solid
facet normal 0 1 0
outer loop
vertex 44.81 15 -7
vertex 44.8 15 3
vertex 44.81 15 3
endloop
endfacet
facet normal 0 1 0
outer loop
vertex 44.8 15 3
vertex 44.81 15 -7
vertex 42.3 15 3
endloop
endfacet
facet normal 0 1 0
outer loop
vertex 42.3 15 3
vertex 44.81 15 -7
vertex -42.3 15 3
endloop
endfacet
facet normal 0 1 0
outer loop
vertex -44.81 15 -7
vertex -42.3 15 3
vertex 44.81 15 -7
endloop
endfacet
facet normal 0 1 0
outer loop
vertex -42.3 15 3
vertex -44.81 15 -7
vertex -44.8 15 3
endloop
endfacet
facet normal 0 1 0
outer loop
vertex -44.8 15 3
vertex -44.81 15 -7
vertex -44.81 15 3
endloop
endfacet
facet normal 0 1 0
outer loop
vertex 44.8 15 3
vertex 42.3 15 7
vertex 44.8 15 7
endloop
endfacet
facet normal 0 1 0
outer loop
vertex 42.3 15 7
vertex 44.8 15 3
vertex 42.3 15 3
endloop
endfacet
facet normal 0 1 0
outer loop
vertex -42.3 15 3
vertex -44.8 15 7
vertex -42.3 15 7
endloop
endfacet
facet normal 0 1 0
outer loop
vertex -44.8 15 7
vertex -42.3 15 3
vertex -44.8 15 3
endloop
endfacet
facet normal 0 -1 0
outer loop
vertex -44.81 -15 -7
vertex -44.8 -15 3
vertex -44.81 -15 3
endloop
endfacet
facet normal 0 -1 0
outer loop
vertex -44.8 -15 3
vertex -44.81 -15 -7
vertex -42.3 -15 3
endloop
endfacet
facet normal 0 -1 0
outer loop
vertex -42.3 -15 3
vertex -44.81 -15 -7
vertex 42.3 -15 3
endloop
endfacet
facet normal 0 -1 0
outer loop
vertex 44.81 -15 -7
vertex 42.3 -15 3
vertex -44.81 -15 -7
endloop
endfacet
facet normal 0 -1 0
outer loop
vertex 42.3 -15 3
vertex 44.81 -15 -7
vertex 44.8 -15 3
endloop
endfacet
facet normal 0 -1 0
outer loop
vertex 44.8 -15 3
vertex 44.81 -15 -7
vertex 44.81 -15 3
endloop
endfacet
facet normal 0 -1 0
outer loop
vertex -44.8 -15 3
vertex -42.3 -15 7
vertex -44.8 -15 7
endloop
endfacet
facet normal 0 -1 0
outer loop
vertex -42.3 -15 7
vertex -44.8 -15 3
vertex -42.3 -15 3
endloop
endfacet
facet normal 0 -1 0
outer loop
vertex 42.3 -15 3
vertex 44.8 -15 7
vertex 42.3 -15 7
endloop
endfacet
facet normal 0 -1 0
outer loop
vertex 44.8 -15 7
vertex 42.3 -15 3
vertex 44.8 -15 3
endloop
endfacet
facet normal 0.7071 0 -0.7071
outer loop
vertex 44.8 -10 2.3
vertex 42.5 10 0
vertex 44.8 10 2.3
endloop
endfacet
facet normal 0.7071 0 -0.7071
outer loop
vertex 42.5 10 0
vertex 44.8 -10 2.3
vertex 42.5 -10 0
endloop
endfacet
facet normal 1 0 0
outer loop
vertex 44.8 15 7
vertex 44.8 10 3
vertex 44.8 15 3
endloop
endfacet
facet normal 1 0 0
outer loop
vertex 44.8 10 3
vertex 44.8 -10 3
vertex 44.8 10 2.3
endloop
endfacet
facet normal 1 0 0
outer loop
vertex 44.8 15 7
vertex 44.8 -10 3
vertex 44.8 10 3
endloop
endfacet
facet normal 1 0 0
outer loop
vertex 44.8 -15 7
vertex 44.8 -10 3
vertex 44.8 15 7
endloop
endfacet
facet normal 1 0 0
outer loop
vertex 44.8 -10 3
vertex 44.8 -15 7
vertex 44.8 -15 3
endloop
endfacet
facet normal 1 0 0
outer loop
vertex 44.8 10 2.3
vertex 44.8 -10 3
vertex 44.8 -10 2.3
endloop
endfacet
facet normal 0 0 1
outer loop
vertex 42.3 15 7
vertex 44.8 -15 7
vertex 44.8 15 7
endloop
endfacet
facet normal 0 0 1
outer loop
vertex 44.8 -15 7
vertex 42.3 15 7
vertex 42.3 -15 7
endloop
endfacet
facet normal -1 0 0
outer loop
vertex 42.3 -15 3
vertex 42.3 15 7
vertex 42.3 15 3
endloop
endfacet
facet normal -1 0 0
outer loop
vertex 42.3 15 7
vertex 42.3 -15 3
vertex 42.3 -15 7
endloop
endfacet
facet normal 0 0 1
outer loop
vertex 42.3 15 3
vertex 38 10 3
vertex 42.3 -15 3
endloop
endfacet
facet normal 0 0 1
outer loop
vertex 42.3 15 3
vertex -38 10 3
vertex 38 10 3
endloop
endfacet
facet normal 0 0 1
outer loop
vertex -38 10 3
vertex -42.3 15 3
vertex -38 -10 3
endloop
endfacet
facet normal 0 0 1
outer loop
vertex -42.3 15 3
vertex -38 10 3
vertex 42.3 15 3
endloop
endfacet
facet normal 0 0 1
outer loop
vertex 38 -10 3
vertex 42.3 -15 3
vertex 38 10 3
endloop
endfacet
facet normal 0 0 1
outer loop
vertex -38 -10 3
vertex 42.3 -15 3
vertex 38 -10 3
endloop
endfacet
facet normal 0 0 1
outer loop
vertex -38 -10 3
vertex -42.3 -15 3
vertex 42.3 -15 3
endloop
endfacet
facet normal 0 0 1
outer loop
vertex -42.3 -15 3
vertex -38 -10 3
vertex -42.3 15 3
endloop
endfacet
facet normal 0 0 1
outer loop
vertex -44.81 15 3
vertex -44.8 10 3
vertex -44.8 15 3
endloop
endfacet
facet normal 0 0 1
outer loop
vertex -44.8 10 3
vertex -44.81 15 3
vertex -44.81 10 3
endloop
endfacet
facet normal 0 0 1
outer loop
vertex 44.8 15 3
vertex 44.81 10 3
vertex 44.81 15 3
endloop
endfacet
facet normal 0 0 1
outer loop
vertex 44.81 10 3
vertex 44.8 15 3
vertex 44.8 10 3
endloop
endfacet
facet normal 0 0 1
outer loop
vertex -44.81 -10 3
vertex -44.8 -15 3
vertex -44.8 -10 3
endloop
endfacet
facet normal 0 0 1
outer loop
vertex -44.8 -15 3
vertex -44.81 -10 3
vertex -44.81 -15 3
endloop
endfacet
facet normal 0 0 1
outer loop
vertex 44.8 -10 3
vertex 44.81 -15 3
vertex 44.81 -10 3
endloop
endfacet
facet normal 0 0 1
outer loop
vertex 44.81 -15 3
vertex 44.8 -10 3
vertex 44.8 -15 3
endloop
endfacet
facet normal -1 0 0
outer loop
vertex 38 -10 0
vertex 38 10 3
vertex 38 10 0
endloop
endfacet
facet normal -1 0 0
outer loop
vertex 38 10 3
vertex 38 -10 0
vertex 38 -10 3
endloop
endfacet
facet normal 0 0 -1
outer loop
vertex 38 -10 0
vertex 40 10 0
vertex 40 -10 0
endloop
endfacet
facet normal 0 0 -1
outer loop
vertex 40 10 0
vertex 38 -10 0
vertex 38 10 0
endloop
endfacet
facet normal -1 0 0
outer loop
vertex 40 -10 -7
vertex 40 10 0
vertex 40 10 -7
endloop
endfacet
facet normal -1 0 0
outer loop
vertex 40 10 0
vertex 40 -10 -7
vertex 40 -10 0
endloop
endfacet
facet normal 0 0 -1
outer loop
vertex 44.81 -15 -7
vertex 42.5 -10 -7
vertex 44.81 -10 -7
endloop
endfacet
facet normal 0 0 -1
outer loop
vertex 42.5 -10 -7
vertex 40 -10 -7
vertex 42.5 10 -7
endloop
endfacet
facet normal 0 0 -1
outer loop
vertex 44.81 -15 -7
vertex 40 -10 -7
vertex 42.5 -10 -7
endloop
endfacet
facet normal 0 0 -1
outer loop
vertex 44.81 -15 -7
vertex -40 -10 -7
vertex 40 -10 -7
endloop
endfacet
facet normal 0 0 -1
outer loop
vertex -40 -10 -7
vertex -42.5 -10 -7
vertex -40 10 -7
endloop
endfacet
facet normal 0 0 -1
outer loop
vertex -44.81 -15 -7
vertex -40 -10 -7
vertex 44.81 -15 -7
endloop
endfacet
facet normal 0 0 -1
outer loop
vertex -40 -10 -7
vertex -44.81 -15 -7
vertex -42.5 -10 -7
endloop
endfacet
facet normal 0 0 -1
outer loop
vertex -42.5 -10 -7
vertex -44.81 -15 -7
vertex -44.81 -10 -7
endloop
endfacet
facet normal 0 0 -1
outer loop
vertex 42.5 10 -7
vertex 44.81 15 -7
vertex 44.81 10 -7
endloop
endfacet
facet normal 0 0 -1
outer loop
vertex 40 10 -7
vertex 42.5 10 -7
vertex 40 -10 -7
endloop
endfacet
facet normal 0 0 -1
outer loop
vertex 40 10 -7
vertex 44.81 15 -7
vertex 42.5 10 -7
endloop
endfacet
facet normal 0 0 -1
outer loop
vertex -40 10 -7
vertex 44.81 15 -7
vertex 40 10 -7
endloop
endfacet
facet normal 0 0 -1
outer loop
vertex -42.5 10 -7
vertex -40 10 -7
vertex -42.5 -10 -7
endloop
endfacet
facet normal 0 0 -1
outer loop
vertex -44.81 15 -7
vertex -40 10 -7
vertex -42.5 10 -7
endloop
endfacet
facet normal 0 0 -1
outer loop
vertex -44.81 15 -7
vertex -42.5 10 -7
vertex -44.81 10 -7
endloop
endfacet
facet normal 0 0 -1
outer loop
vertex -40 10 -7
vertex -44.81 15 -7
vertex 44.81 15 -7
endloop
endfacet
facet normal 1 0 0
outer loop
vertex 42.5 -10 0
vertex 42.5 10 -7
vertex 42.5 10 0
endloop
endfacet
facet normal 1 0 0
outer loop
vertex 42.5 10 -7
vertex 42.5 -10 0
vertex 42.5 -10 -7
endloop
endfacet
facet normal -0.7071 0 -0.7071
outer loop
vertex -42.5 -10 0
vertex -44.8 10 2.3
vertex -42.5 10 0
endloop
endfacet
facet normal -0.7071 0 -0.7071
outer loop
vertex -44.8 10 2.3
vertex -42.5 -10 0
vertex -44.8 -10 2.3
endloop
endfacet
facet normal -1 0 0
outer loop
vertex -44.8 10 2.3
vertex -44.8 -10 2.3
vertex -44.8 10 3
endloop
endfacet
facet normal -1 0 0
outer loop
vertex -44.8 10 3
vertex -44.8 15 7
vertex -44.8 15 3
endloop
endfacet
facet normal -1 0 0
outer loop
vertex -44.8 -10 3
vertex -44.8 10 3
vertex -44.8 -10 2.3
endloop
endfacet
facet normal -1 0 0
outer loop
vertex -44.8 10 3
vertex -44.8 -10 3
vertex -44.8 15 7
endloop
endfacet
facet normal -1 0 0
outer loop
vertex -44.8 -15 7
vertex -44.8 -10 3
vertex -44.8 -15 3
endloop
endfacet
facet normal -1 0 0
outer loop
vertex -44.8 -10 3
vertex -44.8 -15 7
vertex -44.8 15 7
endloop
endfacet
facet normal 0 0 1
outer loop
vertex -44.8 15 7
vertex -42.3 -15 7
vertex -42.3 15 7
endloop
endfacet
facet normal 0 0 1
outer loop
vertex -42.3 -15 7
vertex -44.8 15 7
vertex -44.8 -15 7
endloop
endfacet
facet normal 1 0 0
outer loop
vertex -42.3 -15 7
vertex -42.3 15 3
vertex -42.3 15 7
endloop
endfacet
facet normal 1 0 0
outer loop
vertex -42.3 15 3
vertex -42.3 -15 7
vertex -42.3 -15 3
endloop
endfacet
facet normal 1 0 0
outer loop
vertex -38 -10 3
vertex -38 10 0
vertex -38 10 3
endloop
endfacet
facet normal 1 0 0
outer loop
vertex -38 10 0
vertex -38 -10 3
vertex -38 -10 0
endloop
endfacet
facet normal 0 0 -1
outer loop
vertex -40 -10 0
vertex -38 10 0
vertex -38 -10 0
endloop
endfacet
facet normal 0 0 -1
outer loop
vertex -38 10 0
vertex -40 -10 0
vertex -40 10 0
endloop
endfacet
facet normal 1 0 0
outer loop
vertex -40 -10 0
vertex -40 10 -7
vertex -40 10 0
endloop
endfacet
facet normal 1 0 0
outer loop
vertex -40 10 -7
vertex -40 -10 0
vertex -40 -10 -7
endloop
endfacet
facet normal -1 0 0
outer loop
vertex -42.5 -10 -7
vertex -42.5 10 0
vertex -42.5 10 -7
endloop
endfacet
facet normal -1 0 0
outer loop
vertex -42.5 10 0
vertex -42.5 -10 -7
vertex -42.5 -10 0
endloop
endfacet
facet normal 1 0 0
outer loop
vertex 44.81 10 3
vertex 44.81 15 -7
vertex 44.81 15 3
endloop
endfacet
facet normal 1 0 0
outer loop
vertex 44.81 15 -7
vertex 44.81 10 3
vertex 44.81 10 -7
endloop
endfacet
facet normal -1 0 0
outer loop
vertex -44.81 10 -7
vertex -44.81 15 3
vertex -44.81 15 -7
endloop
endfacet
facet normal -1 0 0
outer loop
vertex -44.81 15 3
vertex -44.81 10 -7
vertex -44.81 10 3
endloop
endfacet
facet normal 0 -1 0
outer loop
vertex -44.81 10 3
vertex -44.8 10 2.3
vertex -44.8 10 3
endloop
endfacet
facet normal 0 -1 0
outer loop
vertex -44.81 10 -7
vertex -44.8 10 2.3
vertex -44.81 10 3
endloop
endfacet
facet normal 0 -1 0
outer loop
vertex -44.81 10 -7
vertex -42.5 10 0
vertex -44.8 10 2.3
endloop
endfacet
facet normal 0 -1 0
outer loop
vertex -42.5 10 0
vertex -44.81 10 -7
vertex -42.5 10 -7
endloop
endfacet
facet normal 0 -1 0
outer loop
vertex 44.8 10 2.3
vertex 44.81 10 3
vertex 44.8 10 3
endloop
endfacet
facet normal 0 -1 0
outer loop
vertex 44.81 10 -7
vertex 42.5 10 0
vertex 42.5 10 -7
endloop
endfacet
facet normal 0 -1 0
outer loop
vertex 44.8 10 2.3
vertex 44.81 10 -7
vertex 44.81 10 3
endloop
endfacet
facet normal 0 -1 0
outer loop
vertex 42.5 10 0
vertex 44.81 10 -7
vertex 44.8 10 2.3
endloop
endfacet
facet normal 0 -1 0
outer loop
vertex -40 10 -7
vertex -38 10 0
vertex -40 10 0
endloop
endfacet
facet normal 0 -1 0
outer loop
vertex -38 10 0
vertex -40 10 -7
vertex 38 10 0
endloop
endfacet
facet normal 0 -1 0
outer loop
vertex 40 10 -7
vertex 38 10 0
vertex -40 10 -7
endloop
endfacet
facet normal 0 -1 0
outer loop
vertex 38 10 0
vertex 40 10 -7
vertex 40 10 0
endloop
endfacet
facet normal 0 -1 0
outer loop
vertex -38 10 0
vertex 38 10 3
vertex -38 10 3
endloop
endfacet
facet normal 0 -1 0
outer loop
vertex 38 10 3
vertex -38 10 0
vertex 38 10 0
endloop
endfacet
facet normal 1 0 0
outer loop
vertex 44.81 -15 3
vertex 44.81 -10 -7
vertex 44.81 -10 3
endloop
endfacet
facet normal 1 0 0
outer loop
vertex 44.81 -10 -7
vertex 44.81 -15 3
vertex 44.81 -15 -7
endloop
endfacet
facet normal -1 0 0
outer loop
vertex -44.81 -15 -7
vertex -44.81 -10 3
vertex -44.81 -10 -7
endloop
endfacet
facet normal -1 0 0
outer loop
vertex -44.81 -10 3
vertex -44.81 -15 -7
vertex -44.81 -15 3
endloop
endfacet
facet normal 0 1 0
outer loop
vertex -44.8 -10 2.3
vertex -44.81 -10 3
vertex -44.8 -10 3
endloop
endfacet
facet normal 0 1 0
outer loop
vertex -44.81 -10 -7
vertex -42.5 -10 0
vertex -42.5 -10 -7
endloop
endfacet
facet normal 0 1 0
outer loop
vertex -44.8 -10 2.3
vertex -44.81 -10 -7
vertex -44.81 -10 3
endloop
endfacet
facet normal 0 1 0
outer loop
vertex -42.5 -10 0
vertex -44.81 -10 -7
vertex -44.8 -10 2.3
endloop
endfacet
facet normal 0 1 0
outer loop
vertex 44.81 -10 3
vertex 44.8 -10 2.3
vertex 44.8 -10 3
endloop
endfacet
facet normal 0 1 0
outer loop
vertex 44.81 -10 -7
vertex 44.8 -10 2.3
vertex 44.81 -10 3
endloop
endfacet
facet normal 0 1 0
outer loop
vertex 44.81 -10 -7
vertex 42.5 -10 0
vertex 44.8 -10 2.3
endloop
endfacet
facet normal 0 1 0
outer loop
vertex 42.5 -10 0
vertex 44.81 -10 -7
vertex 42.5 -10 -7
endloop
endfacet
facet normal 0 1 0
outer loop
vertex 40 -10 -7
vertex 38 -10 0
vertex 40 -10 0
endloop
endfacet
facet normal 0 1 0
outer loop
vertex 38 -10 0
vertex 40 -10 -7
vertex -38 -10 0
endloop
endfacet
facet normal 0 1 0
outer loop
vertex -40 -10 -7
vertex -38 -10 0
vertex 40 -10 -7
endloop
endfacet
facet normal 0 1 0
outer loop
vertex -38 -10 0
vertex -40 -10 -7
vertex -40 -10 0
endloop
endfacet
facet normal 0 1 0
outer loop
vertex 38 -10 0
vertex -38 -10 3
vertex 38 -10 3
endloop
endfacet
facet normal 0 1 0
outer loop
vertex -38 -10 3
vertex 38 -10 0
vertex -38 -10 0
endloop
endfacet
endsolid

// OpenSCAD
// file: ../lib/gridfinity.scad
// SPDX-License-Identifier: MIT
// Copyright (c) 2026 Aaron Cupp
//
// gridfinity.scad — shared Gridfinity baseplate + bin library (per spec).
//
// 42 mm pitch, 41.5 mm bins, baseplate socket 0.7/1.8/2.15 = 4.65 mm, 4 mm
// fillet; bin foot 0.8/1.8/2.15 = 4.75 mm, 3.75 mm corner radius. Verified the
// bin foot seats in the baseplate socket with ~0.25–0.5 mm clearance.
//
//   baseplate(nx, ny)                      — tiled receiving baseplate
//   bin_blank(nx, ny, h)                   — solid bin body (feet + block, no cavity)
//   bin(nx, ny, h, wall, floor)            — open Gridfinity bin
//   divided_bin(nx, ny, h, cols, rows, …)  — bin with internal compartments
//   lid(nx, ny, …)                         — friction lid for a bin of the same footprint
//   stack_base(nx, ny, h, …)               — baseplate-topped base; a bin socket-stacks on it

GF = 42; GF_FILLET = 4;
_C_TOP = 2.15; _C_MID = 1.8; _C_BOT = 0.7;
_BP_LIP = _C_TOP + _C_MID + _C_BOT; _BP_FLOOR = 1.2; BP_H = _BP_LIP + _BP_FLOOR;  // 5.85
BIN_SZ = 41.5; BIN_R = 3.75; BIN_BASE_H = 4.75;

// ---- baseplate ----
module _bp_cell(i = 0) { offset(r = -i) offset(r = GF_FILLET) offset(r = -GF_FILLET) square(GF, center = true); }
module _bp_socket() {
    e = 0.01;
    hull() { translate([0,0,BP_H-e]) linear_extrude(e) _bp_cell(0); translate([0,0,BP_H-_C_TOP]) linear_extrude(e) _bp_cell(_C_TOP); }
    translate([0,0,BP_H-_C_TOP-_C_MID]) linear_extrude(_C_MID) _bp_cell(_C_TOP);
    hull() { translate([0,0,BP_H-_C_TOP-_C_MID-e]) linear_extrude(e) _bp_cell(_C_TOP); translate([0,0,BP_H-_BP_LIP]) linear_extrude(e) _bp_cell(_C_TOP+_C_BOT); }
}
module baseplate(nx, ny) {
    w = nx*GF; d = ny*GF;
    difference() {
        translate([0,0,BP_H/2]) linear_extrude(BP_H, center=true) offset(GF_FILLET) offset(-GF_FILLET) square([w,d], center=true);
        for (ix=[0:nx-1], iy=[0:ny-1]) translate([(ix-(nx-1)/2)*GF, (iy-(ny-1)/2)*GF, 0]) _bp_socket();
    }
}

// ---- bin ----
module _bin_cell(i = 0) { offset(r = -i) offset(r = BIN_R) offset(r = -BIN_R) square(BIN_SZ, center = true); }
module _bin_foot() {
    e = 0.01;
    hull() { linear_extrude(e) _bin_cell(2.95); translate([0,0,0.8]) linear_extrude(e) _bin_cell(2.15); }    // bottom chamfer
    translate([0,0,0.8]) linear_extrude(1.8) _bin_cell(2.15);                                                 // vertical
    hull() { translate([0,0,2.6]) linear_extrude(e) _bin_cell(2.15); translate([0,0,BIN_BASE_H]) linear_extrude(e) _bin_cell(0); } // top chamfer
}
// Solid bin body: Gridfinity feet + the block above them, with no cavity cut.
// Cup-style bins (lib/vessel.scad) subtract their own bores from this instead of
// re-deriving the foot + shell union.
module bin_blank(nx, ny, h) {
    W = nx*GF - 0.5; D = ny*GF - 0.5;
    union() {
        for (ix=[0:nx-1], iy=[0:ny-1]) translate([(ix-(nx-1)/2)*GF, (iy-(ny-1)/2)*GF, 0]) _bin_foot();
        translate([0,0,BIN_BASE_H]) linear_extrude(h-BIN_BASE_H) offset(BIN_R) offset(-BIN_R) square([W,D], center=true);
    }
}

module _bin_shell(nx, ny, h, wall, floor) {
    W = nx*GF - 0.5; D = ny*GF - 0.5;
    difference() {
        bin_blank(nx, ny, h);
        translate([0,0,BIN_BASE_H+floor]) linear_extrude(h) offset(BIN_R-wall) offset(-(BIN_R-wall)) square([W-2*wall, D-2*wall], center=true);
    }
}
module bin(nx, ny, h, wall = 1.2, floor = 1.4) { _bin_shell(nx, ny, h, wall, floor); }

// ---- stacking base ----
// A bin whose TOP is a Gridfinity baseplate, so a standard bin socket-stacks on
// it (two-tier towers: instrument on top, cords/jig/adapters in the base). The
// base is open at the FRONT (−Y) by default so the lower item is reachable while
// the top tier stays socketed — same idea as drybox-splitter-stand's open cubby.
// The whole tower foots on the bench baseplate via this base's own foot.
//
//   h = interior height of the lower compartment (floor to the baseplate cap).
module stack_base(nx, ny, h, wall = 1.2, floor = 1.4, open_front = true) {
    W = nx*GF - 0.5; D = ny*GF - 0.5;
    z0 = BIN_BASE_H + floor;
    iw = W - 2*wall; id = D - 2*wall;
    difference() {
        union() {
            bin_blank(nx, ny, h);                    // solid foot + block to h
            translate([0,0,h]) baseplate(nx, ny);    // baseplate cap (sockets up)
        }
        // lower cavity, floor up to the cap underside
        translate([0,0,z0]) linear_extrude(h - z0 + 0.01)
            offset(BIN_R-wall) offset(-(BIN_R-wall)) square([iw, id], center=true);
        // open front: cut the −Y wall so you reach in under the cap
        if (open_front)
            translate([-iw/2, -D, z0]) cube([iw, D/2 + 0.01, h - z0 + 0.01]);
    }
}

module divided_bin(nx, ny, h, cols = 1, rows = 1, wall = 1.2, floor = 1.4, div = 1.2) {
    W = nx*GF - 0.5; D = ny*GF - 0.5;
    union() {
        bin(nx, ny, h, wall, floor);
        // internal divider walls (from the floor up to the rim)
        iw = W - 2*wall; id = D - 2*wall; z0 = BIN_BASE_H + floor;
        for (c = [1 : cols-1]) translate([-iw/2 + c*iw/cols - div/2, -id/2, z0]) cube([div, id, h - z0]);
        for (r = [1 : rows-1]) translate([-iw/2, -id/2 + r*id/rows - div/2, z0]) cube([iw, div, h - z0]);
    }
}

// ---- lid ----
// Friction lid for a bin of the same footprint: a flat plate with a skirt that
// drops into the bin's cavity. Emitted PRINT-READY — plate on the bed, skirt
// standing up — so it needs no supports. Flip it in your head to picture it
// fitted: the plate then caps the rim and the lid adds `t` to the stack height.
//
// Why lids exist here: full-extension drawer slides let small parts hop between
// compartments on a hard close, and brass inserts aren't magnetic — you can't
// sweep them back. `wall` must match the bin's wall so the skirt lands in the
// cavity; `clearance` is per-side slop between skirt and cavity.
module lid(nx, ny, t = 1.6, skirt = 4, wall = 1.2, clearance = 0.35, lid_wall = 1.6) {
    W = nx*GF - 0.5; D = ny*GF - 0.5;
    iw = W - 2*wall - 2*clearance; id = D - 2*wall - 2*clearance;   // skirt outer
    ir = BIN_R - wall;                                              // cavity corner radius
    union() {
        linear_extrude(t) offset(BIN_R) offset(-BIN_R) square([W, D], center=true);
        translate([0,0,t]) linear_extrude(skirt) difference() {
            offset(ir) offset(-ir) square([iw, id], center=true);
            offset(ir-lid_wall) offset(-(ir-lid_wall)) square([iw-2*lid_wall, id-2*lid_wall], center=true);
        }
    }
}
// file: engindot_frame.scad
// engindot_frame.scad — one-piece drop-over frame for the ENGINDOT top. PRINT ONE.
//
// Part 1 of 2. The stock Clickfinity plate (engindot_plate.scad) drops into the
// inner ledge and is bonded there; bins click into the plate. Same two-part
// split as owon-spm8104-tray, for the same reason — the plate must print
// latches-UP, the frame walls-DOWN, and no single orientation suits both.
//
// NO CLAMP, NO HARDWARE. Retention is passive:
//   * front/back LIPS hook the top edges  -> cannot slide fore-aft
//   * short side SKIRTS hug the case      -> cannot slide sideways
//   * gravity                             -> holds it down
//
// The skirts are deliberately SHORT here. The ENGINDOT vents the full height of
// both sides, so a 20 mm skirt like the OWON's would sit over the intake. The
// lips carry the retention; the skirts only locate. SKIRT_D is the knob.
//
// Unlike the OWON, the plate (84 mm) is much narrower than the case (102 mm),
// so the ledge is a real shelf spanning ~9 mm each side rather than a 2 mm lip.
// LEDGE_T is thickened to suit.
//
// PRINT: as rendered — walls UP, so the frame outline sits on the bed and the
// only overhang is the inner ledge, which bridges. No supports.
include <shortkiller_common.scad>

_TOP = LEDGE_T + PLATE_T_;

// One side jaw's cross-section (x, z), inner edge outward:
//
//   * a LEDGE_IN-wide lip that catches the plate edge
//   * a solid border, full height, from the plate edge out to the case wall
//   * the short skirt down the case side
//
// The border is SOLID rather than a shelf, and that is a printability decision,
// not a styling one. The plate (84) is much narrower than the lid (102), so the
// gap between them is ~9 mm per side. Carried at ledge height that would be a
// 9 mm one-sided cantilever running the full 217 mm — printed walls-up it hangs
// in air and needs support for its whole length. Full height, it is a wall
// sitting on the bed, and the ONLY overhang left is the LEDGE_IN lip, which
// bridges exactly like the OWON's does.
//
// It is also far stiffer, which this frame wants — it spans 217 mm on 2.5 mm
// skirts.
function _jaw_profile() = [
    [POCKET_HW - LEDGE_IN,  0],
    [POCKET_HW - LEDGE_IN,  LEDGE_T],
    [POCKET_HW,             LEDGE_T],
    [POCKET_HW,             _TOP],
    [TOP_OUT,               _TOP],
    [TOP_OUT,               RAMP],
    [SKIRT_OUT,             0],
    [SKIRT_OUT,            -SKIRT_D],
    [SKIRT_IN,             -SKIRT_D],
    [SKIRT_IN,              0],
];
// No inner ramp any more: the ledge now reaches inboard of the skirt to bear on
// the lid, so the old ramp would sit inside the case volume. Its 2 mm inward
// cantilever bridges, exactly as the OWON's does.

module _jaw(len) {
    translate([0, len/2, 0]) rotate([90, 0, 0])
        linear_extrude(len) polygon(_jaw_profile());
}

// Front/back end-bar: spans the full width, fuses into BOTH jaws to close the
// frame, and carries the lip that hooks the front/back top edge. Overlapped
// into the jaws so it merges without coincident planes.
module _end_bar(s, len) {
    y0 = s > 0 ? len/2 - END_BAR_T : -len/2;
    // FULL HEIGHT to _TOP. This is a printability constraint, not a fit one:
    // walls-up, the frame stands on its skirt tops, and a bar stopping short of
    // that plane bridges ~85 mm across the opening and sags. The plate clears it
    // by fitting BETWEEN the bars — hence the MOUNT_L assert.
    translate([-TOP_OUT - EPS, y0, -END_LIP_D])
        cube([2*TOP_OUT + 2*EPS, END_BAR_T, END_LIP_D + LEDGE_T]);
}

// len defaults to the real MOUNT_L. A short len gives a genuine slice of this
// same geometry for fit-testing — see frame_test_section.scad.
// Shelf carrying the plate's overhang past the end of the frame, 45-degree
// gusset underneath. Walls-down that gusset is self-supporting; a square shelf
// would be an 8.5 mm overhang running the full width.
module _end_shelf(s, len) {
    y0 = s > 0 ? len/2 : -len/2;
    pts = s > 0
        ? [[y0, -END_LIP_D], [y0 + SHELF_OUT, -END_LIP_D + SHELF_OUT],
           [y0 + SHELF_OUT, LEDGE_T], [y0, LEDGE_T]]
        : [[y0, -END_LIP_D], [y0, LEDGE_T],
           [y0 - SHELF_OUT, LEDGE_T], [y0 - SHELF_OUT, -END_LIP_D + SHELF_OUT]];
    translate([-TOP_OUT - EPS, 0, 0])
        rotate([90, 0, 90]) linear_extrude(2*TOP_OUT + 2*EPS) polygon(pts);
}

module frame(len = MOUNT_L) {
    _jaw(len);
    mirror([1, 0, 0]) _jaw(len);
    _end_bar(1, len);
    _end_bar(-1, len);
    // Below ~2 mm the shelf is a sliver wedge that adds nothing and goes
    // non-manifold against the end bar. The plate barely overhangs at that point.
    if (END_SHELF && SHELF_OUT >= 2) {
        _end_shelf(1, len);
        _end_shelf(-1, len);
    }
}

// Rendered WALLS-DOWN — as used AND as printed. Skirt bottoms and end-lip
// bottoms share the bed; the only overhangs are the two 45-degree ramps and the
// 2 mm plate ledge. Do NOT flip this: walls-up leaves the end bars in mid-air.
frame();
// main file
// frame_test_section — a 30 mm slice of engindot_frame.scad. PRINT THIS FIRST.
//
// Not a separate gauge: it calls the SAME frame() module at a short length, so
// the profile, the skirt, the ledge and the plate pocket are bit-identical to
// the real part. If this fits, the frame fits.
//
// Answers, for about 15 minutes and ~15 g:
//   1. Does the skirt drop over the lid snugly at the measured CASE_W = 84?
//   2. ⚠️ IT DOES **NOT** TEST THE PLATE POCKET. This is a closed loop — end
//      bars at both ends with ~20 mm of pocket between them — so a 210 mm plate
//      can never enter it. An earlier version of this comment claimed otherwise
//      and was wrong. Use frame_width_gauge (6 g) if all you want is the span.
//   3. Does the 6 mm skirt sit where you want it against the side vents?
//
// PRINT: as rendered — walls DOWN, no supports. Same orientation as the frame.
include <shortkiller_common.scad>
use <engindot_frame.scad>

frame(30);
